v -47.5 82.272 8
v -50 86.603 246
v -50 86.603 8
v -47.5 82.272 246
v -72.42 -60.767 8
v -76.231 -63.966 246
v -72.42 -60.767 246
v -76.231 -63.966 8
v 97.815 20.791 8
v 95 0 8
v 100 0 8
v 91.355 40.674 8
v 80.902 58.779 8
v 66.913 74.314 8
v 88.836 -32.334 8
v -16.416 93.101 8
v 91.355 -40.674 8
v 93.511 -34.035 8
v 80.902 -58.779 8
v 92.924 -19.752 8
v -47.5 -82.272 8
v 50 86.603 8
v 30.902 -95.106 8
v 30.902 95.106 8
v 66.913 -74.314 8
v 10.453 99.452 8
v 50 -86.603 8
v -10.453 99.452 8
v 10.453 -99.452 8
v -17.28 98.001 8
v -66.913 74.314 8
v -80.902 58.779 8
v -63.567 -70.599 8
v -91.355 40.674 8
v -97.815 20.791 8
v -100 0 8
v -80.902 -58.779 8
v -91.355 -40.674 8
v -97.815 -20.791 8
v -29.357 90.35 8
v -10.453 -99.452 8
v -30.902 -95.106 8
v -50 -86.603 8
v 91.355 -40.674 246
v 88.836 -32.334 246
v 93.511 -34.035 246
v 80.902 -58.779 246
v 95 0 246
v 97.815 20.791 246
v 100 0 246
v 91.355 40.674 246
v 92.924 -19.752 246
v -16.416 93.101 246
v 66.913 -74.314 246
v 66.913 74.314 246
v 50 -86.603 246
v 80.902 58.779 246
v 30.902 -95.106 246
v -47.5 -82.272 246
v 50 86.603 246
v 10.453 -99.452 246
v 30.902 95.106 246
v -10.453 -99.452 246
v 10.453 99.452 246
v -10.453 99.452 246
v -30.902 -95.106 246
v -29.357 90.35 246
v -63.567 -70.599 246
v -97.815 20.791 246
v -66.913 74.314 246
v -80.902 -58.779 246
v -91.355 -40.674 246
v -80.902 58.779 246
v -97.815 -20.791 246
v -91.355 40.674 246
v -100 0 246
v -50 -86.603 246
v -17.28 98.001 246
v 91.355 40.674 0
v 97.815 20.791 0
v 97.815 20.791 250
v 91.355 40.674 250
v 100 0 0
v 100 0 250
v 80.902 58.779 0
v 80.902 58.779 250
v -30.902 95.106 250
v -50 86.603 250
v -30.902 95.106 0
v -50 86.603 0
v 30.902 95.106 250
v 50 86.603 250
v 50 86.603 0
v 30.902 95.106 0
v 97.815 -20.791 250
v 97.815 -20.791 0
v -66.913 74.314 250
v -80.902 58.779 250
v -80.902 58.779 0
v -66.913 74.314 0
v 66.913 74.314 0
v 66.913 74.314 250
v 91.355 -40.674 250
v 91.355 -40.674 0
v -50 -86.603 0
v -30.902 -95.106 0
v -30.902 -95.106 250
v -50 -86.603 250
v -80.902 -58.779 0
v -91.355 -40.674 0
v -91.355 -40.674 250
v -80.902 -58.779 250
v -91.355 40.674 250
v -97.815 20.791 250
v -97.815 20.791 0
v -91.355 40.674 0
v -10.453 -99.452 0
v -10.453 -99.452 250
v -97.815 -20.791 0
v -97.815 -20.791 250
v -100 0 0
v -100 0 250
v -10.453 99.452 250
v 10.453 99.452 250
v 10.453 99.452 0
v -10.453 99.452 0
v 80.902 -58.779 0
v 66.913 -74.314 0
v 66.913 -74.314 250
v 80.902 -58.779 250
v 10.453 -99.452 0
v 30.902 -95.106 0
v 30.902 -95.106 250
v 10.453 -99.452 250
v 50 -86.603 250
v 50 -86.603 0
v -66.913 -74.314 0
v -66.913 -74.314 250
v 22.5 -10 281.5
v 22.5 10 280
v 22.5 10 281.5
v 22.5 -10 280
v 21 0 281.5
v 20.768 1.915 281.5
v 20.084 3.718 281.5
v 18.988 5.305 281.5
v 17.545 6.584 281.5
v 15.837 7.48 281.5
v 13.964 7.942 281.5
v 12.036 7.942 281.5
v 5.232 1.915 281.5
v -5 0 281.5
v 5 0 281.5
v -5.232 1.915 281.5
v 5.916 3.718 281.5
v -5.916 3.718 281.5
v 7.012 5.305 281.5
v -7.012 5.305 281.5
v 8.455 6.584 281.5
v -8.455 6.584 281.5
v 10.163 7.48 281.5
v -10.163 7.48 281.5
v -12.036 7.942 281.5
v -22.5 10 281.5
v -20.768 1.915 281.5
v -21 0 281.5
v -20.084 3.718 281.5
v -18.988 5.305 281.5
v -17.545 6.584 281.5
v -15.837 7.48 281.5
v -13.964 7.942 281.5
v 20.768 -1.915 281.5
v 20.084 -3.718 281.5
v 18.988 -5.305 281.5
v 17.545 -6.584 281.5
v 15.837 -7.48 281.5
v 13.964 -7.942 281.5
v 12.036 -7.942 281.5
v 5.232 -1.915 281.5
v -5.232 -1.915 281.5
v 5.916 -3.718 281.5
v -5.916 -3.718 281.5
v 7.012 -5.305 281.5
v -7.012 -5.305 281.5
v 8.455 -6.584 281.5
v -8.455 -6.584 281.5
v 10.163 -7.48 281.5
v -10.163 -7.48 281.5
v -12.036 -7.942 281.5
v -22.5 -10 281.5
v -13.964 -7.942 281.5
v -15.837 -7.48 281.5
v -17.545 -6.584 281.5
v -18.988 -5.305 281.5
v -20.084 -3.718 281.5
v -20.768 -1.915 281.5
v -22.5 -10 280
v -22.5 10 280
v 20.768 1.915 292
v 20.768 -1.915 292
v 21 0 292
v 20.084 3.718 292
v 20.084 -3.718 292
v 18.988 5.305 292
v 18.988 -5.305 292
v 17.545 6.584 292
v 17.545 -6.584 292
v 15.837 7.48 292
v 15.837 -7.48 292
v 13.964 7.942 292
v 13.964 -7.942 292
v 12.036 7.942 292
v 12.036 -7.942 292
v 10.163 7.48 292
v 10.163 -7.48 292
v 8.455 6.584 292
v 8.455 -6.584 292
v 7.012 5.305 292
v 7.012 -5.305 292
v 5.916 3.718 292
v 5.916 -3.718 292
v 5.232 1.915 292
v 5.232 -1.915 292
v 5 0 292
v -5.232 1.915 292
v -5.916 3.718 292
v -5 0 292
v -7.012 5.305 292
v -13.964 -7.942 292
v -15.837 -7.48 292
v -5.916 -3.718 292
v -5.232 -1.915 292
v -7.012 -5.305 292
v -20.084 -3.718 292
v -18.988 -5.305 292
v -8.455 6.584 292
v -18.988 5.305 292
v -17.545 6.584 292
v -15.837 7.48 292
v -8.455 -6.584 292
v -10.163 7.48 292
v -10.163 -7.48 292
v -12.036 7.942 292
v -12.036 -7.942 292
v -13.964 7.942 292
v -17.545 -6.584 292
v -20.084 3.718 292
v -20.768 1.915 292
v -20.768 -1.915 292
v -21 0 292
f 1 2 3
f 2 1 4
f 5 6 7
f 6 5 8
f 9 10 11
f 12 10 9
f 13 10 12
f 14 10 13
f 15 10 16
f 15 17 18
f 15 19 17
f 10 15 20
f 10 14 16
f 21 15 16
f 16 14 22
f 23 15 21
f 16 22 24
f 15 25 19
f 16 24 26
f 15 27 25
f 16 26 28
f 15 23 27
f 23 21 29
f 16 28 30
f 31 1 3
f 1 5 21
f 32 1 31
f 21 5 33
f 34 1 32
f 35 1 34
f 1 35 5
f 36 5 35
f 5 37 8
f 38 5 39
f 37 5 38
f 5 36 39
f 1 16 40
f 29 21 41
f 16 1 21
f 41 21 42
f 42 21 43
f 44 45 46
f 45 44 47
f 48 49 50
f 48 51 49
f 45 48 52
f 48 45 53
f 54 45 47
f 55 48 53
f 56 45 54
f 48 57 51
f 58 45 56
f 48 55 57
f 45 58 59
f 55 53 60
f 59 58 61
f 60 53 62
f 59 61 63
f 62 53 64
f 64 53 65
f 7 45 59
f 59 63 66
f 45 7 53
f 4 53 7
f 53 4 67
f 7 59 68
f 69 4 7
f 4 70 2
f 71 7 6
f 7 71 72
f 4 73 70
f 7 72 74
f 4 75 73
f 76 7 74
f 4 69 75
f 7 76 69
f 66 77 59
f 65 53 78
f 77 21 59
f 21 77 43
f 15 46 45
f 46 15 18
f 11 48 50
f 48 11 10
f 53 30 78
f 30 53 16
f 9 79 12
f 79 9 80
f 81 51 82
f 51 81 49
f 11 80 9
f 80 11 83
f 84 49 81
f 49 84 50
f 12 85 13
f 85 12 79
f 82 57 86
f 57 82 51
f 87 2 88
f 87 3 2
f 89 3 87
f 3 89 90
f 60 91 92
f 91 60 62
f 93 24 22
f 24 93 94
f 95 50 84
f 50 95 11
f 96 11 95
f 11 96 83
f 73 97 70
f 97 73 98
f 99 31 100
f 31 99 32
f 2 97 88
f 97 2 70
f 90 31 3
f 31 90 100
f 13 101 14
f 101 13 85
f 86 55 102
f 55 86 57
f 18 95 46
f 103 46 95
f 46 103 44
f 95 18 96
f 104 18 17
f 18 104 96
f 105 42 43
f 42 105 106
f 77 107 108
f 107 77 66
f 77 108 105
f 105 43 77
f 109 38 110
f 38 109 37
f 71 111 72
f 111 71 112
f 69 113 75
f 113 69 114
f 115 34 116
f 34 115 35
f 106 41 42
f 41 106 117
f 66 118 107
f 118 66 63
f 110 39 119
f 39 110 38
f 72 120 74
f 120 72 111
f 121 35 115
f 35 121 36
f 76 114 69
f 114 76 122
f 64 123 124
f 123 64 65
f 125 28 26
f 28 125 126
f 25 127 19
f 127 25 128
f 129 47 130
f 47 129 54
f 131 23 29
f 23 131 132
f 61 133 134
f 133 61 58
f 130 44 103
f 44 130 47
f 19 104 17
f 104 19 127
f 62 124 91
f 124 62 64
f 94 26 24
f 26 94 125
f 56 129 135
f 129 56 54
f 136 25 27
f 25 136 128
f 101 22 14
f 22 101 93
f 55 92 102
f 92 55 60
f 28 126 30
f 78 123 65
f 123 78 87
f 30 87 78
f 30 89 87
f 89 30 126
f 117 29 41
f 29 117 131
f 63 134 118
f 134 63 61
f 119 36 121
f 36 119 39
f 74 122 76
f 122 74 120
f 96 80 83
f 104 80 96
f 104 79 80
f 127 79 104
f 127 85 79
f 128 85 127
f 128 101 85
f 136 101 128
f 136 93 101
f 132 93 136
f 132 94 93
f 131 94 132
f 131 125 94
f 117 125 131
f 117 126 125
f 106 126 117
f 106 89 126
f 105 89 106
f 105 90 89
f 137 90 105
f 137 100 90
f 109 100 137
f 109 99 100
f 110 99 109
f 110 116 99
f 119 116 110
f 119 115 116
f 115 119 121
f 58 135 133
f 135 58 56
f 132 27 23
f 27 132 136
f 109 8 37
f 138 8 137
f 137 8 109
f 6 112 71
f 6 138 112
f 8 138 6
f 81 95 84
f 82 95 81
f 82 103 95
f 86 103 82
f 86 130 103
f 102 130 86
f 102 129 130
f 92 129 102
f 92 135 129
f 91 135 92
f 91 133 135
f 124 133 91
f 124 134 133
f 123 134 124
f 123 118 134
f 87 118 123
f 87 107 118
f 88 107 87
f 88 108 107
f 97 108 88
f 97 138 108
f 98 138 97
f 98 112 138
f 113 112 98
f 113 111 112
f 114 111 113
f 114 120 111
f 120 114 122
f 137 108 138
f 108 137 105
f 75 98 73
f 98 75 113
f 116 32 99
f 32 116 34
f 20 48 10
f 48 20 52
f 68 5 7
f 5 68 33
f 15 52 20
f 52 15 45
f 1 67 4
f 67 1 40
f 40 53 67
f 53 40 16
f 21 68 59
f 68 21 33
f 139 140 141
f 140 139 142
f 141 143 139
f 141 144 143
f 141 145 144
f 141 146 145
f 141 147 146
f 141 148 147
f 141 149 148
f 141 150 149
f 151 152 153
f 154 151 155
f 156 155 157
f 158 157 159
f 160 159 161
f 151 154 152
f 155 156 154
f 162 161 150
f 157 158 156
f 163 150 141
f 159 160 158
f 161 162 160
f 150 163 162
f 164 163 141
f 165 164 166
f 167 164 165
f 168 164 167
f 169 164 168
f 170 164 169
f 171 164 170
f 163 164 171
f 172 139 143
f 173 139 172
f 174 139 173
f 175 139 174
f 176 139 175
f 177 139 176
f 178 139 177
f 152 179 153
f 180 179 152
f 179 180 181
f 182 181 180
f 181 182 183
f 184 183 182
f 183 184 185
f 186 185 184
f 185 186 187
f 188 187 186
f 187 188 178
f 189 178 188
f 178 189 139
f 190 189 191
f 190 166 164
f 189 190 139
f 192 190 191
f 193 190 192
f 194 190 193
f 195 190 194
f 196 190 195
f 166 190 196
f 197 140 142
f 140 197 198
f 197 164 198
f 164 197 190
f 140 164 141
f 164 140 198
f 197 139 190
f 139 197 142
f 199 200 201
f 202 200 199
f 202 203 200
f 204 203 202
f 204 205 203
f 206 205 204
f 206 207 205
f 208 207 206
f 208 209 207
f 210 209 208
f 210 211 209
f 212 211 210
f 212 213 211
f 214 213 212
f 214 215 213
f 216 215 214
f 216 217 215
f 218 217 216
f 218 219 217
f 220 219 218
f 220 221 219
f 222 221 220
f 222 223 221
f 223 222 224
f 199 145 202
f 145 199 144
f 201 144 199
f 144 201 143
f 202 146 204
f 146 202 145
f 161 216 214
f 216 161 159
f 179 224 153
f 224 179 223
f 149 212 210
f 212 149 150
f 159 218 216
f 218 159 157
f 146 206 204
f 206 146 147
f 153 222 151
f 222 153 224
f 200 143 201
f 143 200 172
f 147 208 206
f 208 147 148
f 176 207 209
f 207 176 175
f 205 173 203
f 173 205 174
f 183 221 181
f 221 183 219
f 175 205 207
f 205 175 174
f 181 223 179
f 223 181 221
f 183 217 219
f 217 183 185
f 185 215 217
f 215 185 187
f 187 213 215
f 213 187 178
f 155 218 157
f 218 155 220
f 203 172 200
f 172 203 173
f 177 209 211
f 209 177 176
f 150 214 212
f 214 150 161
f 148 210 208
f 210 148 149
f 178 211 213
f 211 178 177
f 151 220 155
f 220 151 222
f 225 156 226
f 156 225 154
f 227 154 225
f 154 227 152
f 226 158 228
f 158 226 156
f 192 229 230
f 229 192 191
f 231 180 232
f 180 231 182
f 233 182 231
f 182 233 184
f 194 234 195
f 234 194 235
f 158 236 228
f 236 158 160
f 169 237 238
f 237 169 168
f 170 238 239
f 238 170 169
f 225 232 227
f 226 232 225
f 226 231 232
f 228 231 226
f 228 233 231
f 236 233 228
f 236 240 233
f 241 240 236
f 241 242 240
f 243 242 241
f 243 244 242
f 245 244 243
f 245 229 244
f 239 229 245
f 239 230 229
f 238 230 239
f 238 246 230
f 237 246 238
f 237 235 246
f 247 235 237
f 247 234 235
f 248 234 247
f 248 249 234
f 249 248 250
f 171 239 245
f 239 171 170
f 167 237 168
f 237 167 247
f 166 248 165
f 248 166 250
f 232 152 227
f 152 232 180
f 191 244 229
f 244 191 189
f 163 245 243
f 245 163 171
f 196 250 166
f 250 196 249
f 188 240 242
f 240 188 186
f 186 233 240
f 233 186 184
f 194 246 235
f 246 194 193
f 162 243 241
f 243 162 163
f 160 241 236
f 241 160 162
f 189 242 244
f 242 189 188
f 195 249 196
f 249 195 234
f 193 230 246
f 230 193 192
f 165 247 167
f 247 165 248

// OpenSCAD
wall_thickness = 5.0;
top_platform_thickness = 4.0;
bottom_platform_thickness = 8.0;
total_height = 250.0;
outer_radius = 100.0;
number_of_legs = 3;
leg_radial_thickness = 20.0;

PCB_Width = 45.0;
PCB_Depth = 1.5;
PCB_Height = 20.0;
PCB_Sonic_Height = 12.0;
PCB_Sonic_Radius = 8.0;
PCB_Sonic_Offset = 13.0;


inner_height = total_height - top_platform_thickness - bottom_platform_thickness;
pie_angle = (360 / number_of_legs);

//Subtract smaller cylinder to create hollow
difference() {
    cylinder(h = total_height, r = outer_radius);
    
    translate([0, 0, bottom_platform_thickness])
    { 
        cylinder(h = inner_height, r = outer_radius - wall_thickness);
    }
    
    // Subtract three Pies to leave the legs
    translate([0, 0, bottom_platform_thickness])
    {
        for (i = [1:number_of_legs]) 
        {
            rotate([0, 0, i * pie_angle]) 
                rotate_extrude(angle=pie_angle - leg_radial_thickness)
                    square(inner_height,  outer_radius - wall_thickness);    
        }
    }       
}

translate([0,0,280])
{
    rotate([0,0,0])
    {
         color("Red") Utrasonic();
    }
}
   
module Utrasonic() {
    union() {
        translate([-(PCB_Width / 2), -(PCB_Height / 2), 0])
        {
            cube([PCB_Width, PCB_Height, PCB_Depth]);
        }
        translate([PCB_Sonic_Offset, 0, 0])
        {
            cylinder(h = PCB_Sonic_Height, r = PCB_Sonic_Radius);
        }
        translate([-PCB_Sonic_Offset, 0, 0])
        {
            cylinder(h = PCB_Sonic_Height, r = PCB_Sonic_Radius);
        }
    }
}
